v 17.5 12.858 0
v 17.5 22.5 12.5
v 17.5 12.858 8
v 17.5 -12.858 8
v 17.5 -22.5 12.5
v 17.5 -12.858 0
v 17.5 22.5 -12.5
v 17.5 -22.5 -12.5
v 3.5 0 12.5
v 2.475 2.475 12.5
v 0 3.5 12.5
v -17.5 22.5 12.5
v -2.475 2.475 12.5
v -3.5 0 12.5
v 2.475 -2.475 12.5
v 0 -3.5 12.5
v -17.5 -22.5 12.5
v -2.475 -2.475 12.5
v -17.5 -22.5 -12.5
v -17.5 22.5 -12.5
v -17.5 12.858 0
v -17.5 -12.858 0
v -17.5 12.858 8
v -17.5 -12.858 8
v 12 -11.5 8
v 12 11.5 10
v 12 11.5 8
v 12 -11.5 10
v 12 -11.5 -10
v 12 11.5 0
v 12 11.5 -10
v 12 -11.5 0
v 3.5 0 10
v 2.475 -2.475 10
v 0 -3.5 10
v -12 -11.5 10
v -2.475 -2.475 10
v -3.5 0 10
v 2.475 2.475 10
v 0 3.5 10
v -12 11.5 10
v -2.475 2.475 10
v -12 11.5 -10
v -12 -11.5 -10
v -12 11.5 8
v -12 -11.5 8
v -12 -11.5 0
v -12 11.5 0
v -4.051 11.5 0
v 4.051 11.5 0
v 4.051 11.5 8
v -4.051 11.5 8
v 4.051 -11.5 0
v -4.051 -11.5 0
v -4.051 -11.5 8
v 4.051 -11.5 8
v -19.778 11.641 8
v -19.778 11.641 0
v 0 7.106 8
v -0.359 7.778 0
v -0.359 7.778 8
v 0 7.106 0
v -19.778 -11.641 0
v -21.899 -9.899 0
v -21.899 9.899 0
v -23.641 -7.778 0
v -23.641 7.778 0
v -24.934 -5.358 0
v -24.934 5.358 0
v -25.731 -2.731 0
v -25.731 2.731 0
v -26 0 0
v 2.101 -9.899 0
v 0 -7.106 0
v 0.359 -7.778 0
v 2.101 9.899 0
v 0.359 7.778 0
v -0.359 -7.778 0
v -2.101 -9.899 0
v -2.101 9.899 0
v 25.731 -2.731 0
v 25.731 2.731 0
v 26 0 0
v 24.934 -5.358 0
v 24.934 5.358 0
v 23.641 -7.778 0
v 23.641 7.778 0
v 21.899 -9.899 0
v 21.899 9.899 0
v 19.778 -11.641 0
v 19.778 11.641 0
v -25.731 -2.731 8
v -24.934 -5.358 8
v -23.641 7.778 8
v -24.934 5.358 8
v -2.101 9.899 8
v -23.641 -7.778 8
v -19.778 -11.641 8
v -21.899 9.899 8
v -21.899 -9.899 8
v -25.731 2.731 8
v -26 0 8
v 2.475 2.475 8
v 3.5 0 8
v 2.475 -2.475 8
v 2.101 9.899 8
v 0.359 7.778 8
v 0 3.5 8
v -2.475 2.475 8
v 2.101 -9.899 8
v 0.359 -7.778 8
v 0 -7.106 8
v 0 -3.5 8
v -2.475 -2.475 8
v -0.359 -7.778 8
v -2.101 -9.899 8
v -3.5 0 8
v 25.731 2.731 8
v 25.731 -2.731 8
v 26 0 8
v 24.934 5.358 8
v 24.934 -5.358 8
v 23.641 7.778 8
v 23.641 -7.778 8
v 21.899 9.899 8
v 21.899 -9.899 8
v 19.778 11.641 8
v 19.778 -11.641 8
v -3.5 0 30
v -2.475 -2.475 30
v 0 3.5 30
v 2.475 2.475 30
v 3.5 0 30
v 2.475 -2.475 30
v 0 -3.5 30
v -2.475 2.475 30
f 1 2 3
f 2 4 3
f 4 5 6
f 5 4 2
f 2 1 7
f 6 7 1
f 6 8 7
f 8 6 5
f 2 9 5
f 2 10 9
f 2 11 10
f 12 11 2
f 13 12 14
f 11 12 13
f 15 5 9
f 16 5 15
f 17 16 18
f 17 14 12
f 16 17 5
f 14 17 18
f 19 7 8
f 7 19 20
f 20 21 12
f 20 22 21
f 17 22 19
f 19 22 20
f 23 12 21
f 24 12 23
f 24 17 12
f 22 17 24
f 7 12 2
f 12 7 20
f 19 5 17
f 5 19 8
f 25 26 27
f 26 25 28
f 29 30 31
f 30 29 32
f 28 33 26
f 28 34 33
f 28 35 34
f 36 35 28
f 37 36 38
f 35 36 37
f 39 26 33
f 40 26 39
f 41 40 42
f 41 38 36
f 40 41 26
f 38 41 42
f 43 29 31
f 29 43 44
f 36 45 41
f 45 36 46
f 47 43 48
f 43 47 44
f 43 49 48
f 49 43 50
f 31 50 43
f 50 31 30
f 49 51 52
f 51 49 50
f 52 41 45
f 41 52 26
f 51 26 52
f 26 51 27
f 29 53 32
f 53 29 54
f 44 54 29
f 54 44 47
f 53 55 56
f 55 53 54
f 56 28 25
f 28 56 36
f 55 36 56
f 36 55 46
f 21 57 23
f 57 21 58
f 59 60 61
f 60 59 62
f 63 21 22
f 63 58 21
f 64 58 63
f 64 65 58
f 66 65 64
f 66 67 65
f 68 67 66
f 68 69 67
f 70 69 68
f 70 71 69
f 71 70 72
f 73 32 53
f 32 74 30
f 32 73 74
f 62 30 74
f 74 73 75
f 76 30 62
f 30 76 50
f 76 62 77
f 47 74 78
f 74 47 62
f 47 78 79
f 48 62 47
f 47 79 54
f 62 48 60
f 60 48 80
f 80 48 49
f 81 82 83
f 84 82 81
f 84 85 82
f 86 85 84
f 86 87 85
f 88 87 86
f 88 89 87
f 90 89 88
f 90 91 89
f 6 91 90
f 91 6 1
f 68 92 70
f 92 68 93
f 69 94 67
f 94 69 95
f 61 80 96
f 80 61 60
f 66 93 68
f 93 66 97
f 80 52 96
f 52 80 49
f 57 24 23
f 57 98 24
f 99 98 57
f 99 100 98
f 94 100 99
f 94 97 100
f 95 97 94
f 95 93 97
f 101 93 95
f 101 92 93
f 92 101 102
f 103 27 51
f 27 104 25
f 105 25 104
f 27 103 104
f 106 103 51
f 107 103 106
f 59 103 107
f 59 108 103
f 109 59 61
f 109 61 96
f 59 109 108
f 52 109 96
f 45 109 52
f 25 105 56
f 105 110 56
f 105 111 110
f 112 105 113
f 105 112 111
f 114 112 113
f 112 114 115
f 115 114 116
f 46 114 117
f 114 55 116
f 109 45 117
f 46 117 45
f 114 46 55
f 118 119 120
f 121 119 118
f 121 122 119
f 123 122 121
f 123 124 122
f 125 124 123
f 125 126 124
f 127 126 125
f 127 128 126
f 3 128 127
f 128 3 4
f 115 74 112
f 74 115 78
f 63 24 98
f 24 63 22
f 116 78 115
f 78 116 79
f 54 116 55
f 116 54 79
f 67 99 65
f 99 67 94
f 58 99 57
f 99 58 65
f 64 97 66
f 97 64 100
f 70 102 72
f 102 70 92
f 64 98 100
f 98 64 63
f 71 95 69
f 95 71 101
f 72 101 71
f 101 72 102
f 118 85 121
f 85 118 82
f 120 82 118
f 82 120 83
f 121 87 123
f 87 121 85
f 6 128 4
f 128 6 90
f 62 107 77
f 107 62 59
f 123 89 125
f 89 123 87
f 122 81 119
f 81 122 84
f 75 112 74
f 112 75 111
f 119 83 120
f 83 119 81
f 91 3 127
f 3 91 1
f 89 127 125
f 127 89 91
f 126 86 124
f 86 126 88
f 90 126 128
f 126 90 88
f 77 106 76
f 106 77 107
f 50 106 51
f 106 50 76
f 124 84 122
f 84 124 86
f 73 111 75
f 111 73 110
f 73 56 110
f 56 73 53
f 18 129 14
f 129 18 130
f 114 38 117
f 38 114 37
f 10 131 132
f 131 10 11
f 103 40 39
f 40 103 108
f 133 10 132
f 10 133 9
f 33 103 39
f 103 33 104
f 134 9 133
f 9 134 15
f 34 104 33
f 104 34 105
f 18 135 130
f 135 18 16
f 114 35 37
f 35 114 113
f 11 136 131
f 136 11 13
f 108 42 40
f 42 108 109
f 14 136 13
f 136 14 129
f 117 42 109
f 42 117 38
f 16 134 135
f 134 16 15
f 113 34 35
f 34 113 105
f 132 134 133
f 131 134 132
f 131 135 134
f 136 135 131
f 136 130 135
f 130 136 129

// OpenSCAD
// Tail Joint J1 — Peduncle Servo-Halter
// Material: PETG, 50% Infill

$fn = 32;

module servo_mount() {
    difference() {
        cube([35, 45, 25], center=true);
        cube([24, 23, 20], center=true);
    }
}

module bearing_pocket() {
    cylinder(h=8, r=14, $fn=$fn);
}

module shaft_hole() {
    cylinder(h=30, r=3.5, $fn=8);
}

union() {
    servo_mount();
    translate([-12, 0, 0]) bearing_pocket();
    translate([12, 0, 0]) bearing_pocket();
    shaft_hole();
}
